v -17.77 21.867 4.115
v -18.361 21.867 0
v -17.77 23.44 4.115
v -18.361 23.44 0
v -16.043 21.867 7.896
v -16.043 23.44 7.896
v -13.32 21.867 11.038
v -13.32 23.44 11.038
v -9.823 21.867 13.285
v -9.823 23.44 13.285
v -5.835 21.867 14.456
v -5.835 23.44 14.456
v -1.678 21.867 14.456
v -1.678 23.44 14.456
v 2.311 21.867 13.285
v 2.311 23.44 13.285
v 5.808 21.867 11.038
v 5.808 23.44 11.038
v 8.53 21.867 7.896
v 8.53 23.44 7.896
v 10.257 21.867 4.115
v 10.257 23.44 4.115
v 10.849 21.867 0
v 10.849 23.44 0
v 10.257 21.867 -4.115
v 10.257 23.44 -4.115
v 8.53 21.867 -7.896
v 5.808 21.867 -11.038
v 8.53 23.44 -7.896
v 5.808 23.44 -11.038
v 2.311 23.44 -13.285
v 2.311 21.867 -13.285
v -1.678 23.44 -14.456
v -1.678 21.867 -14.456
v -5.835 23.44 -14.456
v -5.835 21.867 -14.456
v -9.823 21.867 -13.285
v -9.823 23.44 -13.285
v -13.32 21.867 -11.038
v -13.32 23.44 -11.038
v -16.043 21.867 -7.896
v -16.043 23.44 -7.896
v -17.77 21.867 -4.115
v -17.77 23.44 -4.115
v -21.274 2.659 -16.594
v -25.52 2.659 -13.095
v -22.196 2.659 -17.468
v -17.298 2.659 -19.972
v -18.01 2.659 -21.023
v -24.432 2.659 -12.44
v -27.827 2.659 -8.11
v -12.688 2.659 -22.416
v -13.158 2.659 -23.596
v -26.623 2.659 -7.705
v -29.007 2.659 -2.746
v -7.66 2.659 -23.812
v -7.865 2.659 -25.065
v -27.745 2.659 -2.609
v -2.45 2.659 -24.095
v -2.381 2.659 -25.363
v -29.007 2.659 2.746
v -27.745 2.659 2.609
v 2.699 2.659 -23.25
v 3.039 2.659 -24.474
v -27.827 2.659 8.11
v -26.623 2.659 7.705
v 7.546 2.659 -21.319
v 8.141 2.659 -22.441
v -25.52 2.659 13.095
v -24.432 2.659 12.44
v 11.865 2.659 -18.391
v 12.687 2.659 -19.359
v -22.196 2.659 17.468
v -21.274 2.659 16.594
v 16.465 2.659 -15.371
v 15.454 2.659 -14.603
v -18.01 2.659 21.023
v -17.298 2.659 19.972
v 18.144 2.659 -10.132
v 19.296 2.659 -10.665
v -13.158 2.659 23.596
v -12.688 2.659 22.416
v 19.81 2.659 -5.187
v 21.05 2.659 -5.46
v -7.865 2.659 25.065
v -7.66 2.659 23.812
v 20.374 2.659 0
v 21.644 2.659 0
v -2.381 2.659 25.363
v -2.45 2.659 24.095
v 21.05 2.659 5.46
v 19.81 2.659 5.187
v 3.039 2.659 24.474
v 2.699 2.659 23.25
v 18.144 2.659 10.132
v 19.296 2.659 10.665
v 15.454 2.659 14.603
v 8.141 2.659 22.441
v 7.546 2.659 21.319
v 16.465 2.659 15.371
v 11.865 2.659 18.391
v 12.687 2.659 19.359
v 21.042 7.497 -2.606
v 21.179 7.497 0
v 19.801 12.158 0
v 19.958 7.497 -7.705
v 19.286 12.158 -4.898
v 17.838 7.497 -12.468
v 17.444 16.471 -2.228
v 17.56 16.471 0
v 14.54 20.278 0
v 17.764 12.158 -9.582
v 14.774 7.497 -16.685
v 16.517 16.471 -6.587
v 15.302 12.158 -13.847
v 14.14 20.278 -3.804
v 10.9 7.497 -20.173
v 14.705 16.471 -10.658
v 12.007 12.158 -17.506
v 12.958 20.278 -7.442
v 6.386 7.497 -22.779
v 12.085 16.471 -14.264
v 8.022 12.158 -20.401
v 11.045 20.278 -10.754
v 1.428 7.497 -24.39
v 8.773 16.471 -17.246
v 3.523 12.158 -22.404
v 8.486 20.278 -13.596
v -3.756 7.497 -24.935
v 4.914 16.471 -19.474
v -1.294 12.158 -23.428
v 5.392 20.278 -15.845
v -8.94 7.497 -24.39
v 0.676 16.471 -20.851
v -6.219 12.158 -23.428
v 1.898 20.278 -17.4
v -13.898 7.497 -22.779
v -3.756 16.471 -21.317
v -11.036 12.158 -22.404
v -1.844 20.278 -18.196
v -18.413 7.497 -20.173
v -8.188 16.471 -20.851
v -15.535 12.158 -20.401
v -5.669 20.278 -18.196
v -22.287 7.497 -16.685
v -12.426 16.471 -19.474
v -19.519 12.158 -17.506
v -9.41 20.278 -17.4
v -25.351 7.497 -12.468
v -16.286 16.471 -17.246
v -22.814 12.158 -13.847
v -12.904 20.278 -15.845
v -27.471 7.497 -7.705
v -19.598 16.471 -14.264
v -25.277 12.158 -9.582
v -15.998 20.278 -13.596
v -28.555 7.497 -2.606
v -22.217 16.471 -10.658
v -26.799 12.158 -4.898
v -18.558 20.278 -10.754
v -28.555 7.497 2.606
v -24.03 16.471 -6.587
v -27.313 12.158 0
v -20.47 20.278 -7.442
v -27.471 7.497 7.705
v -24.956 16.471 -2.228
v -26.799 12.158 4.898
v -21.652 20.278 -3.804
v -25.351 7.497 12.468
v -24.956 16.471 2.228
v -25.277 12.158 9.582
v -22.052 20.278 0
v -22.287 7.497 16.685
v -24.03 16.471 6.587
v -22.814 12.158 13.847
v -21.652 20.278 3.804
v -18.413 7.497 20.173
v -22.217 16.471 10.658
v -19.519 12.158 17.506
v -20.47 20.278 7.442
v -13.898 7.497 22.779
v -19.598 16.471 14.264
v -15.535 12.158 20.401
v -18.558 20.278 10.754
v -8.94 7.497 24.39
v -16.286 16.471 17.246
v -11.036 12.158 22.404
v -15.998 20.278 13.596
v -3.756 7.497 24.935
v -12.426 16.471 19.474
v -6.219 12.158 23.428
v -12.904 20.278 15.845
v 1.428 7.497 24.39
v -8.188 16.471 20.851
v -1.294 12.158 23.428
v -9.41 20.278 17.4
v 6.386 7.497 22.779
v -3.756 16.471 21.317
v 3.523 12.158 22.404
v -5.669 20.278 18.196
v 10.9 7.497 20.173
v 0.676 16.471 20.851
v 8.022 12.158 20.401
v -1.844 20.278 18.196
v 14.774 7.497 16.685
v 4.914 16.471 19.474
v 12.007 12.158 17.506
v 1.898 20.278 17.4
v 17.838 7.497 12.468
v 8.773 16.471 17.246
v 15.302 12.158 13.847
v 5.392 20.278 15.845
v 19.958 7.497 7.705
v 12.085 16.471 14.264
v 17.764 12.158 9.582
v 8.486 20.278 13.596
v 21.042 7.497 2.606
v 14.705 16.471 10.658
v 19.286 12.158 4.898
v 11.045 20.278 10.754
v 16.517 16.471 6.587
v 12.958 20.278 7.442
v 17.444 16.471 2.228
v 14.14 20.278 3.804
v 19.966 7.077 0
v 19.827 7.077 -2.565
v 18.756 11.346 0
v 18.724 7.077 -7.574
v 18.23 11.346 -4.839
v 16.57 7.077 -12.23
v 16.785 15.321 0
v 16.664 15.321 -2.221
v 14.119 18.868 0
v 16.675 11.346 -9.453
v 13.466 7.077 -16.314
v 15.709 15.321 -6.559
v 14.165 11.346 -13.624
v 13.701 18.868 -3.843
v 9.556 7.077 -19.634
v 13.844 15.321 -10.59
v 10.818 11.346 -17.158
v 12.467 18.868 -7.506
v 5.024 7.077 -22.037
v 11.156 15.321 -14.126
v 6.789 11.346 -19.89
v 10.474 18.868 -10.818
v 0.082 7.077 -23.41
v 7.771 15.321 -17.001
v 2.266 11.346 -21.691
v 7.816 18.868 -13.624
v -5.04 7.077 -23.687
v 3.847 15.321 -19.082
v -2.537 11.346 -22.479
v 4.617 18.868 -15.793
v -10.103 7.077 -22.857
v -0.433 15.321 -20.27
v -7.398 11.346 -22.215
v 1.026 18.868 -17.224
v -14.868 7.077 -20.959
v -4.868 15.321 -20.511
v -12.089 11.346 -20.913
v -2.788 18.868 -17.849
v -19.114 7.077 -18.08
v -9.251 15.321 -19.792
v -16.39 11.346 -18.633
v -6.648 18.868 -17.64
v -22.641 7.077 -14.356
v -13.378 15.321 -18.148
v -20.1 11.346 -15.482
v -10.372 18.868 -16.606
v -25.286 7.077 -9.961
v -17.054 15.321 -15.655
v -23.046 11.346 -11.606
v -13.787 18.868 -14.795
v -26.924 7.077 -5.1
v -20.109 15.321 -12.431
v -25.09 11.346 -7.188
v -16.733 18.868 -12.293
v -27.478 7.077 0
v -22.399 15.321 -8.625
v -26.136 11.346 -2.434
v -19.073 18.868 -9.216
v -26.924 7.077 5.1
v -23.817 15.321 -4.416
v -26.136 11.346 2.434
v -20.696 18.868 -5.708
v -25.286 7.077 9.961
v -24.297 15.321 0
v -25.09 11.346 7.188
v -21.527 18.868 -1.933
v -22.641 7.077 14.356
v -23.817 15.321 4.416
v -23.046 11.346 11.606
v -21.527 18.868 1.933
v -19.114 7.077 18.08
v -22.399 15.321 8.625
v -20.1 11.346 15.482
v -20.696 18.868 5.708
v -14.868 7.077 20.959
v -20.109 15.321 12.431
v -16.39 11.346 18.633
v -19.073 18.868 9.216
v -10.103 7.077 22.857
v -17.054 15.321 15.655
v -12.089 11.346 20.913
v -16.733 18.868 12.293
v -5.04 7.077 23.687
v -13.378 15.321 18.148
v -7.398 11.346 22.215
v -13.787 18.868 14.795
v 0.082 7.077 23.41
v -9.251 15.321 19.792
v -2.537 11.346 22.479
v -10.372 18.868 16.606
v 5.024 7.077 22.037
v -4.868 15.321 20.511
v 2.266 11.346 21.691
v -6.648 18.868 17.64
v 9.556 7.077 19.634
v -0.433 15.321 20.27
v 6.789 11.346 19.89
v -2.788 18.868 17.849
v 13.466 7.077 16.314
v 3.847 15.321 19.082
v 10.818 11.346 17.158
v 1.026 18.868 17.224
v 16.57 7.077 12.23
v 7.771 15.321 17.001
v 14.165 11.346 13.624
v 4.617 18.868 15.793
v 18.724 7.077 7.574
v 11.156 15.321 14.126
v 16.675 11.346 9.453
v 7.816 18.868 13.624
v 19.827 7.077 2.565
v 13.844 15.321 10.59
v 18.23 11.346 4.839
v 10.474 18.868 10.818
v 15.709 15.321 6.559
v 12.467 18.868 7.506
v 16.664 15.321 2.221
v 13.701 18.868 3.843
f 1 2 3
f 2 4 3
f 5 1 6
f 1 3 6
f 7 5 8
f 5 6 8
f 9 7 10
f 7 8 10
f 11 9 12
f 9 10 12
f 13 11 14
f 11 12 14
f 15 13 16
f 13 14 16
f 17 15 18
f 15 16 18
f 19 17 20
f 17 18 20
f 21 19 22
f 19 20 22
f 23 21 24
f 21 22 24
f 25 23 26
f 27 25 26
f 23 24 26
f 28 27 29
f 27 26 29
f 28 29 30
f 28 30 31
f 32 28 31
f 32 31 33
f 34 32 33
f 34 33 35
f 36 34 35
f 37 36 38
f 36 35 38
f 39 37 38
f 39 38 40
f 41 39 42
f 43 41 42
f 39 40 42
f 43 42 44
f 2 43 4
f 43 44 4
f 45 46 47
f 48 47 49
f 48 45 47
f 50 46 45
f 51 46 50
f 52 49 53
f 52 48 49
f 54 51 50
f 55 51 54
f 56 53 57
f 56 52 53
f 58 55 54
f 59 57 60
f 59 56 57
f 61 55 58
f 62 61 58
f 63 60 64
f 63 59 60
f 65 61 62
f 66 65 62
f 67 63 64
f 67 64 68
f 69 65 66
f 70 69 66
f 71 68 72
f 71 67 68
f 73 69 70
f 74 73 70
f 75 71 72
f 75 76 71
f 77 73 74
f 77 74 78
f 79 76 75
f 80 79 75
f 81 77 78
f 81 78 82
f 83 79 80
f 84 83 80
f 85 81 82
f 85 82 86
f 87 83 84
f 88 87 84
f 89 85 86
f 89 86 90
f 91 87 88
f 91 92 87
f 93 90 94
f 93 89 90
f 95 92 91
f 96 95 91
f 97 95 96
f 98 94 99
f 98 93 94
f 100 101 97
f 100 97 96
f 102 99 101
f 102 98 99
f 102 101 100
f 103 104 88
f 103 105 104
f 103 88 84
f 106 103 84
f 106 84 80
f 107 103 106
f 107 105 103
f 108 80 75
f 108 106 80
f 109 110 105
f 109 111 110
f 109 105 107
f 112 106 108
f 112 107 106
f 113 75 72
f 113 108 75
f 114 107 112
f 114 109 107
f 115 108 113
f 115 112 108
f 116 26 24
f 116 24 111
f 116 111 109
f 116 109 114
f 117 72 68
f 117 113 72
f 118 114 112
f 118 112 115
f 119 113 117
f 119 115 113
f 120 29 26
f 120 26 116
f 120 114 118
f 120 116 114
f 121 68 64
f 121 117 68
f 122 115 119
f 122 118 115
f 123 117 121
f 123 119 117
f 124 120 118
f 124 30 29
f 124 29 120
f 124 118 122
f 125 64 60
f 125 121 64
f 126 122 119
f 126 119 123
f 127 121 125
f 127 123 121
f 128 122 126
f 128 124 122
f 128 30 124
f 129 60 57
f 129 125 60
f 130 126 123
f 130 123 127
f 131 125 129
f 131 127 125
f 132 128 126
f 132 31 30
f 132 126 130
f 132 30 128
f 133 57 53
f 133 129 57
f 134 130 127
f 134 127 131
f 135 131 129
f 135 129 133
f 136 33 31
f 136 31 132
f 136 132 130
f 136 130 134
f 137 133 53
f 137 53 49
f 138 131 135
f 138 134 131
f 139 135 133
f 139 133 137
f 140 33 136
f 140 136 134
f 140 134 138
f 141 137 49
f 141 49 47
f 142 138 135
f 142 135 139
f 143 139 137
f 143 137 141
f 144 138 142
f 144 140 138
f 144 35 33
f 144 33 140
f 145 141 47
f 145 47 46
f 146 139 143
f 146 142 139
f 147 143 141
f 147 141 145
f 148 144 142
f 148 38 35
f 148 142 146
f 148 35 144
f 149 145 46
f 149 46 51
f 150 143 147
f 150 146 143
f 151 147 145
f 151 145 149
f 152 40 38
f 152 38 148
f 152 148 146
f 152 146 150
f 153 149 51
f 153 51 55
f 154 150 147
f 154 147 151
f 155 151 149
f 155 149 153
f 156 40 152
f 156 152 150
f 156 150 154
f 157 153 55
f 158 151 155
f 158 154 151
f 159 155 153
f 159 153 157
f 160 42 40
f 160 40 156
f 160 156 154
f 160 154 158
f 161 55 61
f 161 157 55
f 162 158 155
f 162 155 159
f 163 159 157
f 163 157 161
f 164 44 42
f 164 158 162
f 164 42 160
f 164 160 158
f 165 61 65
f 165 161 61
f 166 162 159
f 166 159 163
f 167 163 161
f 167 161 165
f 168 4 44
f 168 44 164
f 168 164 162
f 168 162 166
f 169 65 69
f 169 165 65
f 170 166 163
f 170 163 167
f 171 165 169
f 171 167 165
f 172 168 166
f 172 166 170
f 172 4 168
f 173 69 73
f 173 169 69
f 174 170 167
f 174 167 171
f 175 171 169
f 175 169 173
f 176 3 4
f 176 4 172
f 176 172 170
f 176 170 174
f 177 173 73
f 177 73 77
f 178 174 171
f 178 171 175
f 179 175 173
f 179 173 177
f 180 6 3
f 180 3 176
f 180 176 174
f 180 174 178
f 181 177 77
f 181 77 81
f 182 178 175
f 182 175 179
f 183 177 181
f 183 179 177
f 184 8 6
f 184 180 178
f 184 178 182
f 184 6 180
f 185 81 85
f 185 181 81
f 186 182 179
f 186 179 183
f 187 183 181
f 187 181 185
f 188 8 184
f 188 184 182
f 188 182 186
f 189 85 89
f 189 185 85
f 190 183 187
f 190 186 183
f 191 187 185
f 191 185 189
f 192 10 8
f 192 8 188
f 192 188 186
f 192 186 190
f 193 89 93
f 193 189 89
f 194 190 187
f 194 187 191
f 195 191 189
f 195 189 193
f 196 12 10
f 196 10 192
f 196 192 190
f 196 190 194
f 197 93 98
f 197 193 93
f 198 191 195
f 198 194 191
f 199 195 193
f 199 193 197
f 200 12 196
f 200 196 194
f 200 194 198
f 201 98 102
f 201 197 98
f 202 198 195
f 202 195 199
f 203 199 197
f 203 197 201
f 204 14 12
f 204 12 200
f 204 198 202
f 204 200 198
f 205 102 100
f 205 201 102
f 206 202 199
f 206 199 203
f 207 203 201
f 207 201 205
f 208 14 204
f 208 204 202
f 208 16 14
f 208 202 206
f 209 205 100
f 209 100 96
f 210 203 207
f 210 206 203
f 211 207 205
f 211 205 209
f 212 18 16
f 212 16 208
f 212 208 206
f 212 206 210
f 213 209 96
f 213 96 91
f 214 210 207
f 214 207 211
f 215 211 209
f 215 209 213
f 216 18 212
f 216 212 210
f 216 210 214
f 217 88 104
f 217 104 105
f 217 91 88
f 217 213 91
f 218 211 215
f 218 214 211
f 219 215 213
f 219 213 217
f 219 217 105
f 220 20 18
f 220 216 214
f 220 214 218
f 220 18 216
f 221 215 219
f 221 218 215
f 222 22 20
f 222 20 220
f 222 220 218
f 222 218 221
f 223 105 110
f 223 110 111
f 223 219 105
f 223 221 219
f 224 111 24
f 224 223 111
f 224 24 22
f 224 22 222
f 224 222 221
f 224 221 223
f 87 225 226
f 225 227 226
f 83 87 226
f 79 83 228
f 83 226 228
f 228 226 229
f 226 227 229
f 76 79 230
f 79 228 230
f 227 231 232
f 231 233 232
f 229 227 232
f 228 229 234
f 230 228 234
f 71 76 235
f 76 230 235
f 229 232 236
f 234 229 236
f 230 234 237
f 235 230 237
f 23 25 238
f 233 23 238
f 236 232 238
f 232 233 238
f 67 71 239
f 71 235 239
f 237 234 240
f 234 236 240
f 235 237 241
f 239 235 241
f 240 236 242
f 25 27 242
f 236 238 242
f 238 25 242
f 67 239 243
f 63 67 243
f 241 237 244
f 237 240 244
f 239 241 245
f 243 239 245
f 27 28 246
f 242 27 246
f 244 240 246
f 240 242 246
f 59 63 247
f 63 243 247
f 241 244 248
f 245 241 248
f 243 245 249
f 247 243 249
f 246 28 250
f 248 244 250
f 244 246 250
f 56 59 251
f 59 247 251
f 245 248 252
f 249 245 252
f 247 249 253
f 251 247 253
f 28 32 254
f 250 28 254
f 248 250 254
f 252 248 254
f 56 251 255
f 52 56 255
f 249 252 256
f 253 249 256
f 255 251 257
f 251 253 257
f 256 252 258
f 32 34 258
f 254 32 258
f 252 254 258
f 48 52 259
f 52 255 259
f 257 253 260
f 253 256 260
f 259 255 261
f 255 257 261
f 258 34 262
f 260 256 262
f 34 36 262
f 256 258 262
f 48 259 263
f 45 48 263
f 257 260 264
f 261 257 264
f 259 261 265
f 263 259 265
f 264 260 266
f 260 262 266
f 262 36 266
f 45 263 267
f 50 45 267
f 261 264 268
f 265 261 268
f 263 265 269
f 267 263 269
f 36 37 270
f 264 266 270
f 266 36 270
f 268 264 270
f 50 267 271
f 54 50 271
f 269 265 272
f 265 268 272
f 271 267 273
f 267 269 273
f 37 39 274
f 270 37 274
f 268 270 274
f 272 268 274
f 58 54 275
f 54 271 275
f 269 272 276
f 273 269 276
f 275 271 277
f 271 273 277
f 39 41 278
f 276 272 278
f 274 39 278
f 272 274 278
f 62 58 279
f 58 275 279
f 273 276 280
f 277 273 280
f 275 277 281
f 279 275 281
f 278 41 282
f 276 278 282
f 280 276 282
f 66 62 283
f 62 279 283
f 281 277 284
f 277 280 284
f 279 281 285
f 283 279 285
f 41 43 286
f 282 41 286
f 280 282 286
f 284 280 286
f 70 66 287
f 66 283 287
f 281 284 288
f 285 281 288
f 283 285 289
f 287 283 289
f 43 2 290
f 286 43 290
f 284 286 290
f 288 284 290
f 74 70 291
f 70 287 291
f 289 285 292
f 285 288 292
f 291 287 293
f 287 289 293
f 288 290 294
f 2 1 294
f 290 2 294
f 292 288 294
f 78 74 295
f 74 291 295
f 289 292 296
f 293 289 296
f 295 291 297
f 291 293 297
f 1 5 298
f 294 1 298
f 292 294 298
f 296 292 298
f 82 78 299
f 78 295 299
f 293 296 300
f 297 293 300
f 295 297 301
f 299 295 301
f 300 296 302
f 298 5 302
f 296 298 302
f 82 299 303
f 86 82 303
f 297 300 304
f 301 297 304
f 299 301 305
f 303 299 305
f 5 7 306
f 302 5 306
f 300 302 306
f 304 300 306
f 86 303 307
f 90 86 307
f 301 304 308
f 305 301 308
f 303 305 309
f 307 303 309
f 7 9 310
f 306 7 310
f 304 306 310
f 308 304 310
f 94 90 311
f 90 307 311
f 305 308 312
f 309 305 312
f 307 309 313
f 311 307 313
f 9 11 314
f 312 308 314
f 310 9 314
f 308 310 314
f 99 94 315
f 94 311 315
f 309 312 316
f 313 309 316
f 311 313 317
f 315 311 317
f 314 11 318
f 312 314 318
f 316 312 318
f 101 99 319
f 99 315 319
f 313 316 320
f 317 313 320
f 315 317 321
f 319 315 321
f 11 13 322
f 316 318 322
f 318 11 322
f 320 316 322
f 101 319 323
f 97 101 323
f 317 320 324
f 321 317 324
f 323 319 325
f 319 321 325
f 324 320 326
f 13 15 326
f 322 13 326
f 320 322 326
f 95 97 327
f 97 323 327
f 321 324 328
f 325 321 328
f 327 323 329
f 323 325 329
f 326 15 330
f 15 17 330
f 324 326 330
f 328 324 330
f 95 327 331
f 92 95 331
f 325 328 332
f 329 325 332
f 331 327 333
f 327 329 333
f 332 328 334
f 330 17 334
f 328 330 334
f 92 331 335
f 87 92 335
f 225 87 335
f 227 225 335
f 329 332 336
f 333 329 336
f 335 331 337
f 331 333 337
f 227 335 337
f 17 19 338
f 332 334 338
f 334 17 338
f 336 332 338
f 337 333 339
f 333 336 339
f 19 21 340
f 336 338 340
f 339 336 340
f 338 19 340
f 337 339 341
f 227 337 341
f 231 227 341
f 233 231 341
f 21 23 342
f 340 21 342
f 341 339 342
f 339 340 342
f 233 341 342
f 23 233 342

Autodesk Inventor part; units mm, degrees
sketch "Sketch1" plane through (0, 0, 0) normal (0, 0, 1) x (1, 0, 0)
  arc A0 (21.6438, 2.6591) -> (-3.7562, 28.0591) centre (-3.7562, 2.6591) ccw
  line L0 (-3.7562, 28.0591) -> (-3.7562, 2.6591)
  line L1 (-3.7562, 2.6591) -> (22.0131, 2.6591)
  dimension "d0" = 50.8
revolve "Revolution1" add sketch "Sketch1" angle 360 about axis through (-3.7562, 28.0591, 0) along (0, -1, 0)
ref_plane "Work Plane1" through (0, 0, 19.05) normal (0, 0, 1) x (1, 0, 0)
sketch "Sketch3" plane through (0, 0, 0) normal (0, 0, 1) x (1, 0, 0)
  line L0 (-3.675, 51.7812) -> (-3.675, -20.9618)
shell "Shell2" thickness 1.27 removed faces 1 at (1.2995, 2.6591, -4.9417)
ref_plane "Work Plane3" through (-11.1125, 0, 0) normal (1, 0, 0) x (0, 1, 0)
ref_plane "Work Plane5" through (-3.7562, 28.0591, 0) normal (0, 1, 0) x (-1, 0, 0)
sketch "Sketch12" plane through (-3.7562, 28.0591, 0) normal (0, 1, 0) x (-1, 0, 0)
  circle A0 centre (0, 0) radius 14.605
  dimension "d36" = 29.21
extrude "Extrusion8" cut sketch "Sketch12" against normal blind 25.4
properties part number "SentiBot top"
